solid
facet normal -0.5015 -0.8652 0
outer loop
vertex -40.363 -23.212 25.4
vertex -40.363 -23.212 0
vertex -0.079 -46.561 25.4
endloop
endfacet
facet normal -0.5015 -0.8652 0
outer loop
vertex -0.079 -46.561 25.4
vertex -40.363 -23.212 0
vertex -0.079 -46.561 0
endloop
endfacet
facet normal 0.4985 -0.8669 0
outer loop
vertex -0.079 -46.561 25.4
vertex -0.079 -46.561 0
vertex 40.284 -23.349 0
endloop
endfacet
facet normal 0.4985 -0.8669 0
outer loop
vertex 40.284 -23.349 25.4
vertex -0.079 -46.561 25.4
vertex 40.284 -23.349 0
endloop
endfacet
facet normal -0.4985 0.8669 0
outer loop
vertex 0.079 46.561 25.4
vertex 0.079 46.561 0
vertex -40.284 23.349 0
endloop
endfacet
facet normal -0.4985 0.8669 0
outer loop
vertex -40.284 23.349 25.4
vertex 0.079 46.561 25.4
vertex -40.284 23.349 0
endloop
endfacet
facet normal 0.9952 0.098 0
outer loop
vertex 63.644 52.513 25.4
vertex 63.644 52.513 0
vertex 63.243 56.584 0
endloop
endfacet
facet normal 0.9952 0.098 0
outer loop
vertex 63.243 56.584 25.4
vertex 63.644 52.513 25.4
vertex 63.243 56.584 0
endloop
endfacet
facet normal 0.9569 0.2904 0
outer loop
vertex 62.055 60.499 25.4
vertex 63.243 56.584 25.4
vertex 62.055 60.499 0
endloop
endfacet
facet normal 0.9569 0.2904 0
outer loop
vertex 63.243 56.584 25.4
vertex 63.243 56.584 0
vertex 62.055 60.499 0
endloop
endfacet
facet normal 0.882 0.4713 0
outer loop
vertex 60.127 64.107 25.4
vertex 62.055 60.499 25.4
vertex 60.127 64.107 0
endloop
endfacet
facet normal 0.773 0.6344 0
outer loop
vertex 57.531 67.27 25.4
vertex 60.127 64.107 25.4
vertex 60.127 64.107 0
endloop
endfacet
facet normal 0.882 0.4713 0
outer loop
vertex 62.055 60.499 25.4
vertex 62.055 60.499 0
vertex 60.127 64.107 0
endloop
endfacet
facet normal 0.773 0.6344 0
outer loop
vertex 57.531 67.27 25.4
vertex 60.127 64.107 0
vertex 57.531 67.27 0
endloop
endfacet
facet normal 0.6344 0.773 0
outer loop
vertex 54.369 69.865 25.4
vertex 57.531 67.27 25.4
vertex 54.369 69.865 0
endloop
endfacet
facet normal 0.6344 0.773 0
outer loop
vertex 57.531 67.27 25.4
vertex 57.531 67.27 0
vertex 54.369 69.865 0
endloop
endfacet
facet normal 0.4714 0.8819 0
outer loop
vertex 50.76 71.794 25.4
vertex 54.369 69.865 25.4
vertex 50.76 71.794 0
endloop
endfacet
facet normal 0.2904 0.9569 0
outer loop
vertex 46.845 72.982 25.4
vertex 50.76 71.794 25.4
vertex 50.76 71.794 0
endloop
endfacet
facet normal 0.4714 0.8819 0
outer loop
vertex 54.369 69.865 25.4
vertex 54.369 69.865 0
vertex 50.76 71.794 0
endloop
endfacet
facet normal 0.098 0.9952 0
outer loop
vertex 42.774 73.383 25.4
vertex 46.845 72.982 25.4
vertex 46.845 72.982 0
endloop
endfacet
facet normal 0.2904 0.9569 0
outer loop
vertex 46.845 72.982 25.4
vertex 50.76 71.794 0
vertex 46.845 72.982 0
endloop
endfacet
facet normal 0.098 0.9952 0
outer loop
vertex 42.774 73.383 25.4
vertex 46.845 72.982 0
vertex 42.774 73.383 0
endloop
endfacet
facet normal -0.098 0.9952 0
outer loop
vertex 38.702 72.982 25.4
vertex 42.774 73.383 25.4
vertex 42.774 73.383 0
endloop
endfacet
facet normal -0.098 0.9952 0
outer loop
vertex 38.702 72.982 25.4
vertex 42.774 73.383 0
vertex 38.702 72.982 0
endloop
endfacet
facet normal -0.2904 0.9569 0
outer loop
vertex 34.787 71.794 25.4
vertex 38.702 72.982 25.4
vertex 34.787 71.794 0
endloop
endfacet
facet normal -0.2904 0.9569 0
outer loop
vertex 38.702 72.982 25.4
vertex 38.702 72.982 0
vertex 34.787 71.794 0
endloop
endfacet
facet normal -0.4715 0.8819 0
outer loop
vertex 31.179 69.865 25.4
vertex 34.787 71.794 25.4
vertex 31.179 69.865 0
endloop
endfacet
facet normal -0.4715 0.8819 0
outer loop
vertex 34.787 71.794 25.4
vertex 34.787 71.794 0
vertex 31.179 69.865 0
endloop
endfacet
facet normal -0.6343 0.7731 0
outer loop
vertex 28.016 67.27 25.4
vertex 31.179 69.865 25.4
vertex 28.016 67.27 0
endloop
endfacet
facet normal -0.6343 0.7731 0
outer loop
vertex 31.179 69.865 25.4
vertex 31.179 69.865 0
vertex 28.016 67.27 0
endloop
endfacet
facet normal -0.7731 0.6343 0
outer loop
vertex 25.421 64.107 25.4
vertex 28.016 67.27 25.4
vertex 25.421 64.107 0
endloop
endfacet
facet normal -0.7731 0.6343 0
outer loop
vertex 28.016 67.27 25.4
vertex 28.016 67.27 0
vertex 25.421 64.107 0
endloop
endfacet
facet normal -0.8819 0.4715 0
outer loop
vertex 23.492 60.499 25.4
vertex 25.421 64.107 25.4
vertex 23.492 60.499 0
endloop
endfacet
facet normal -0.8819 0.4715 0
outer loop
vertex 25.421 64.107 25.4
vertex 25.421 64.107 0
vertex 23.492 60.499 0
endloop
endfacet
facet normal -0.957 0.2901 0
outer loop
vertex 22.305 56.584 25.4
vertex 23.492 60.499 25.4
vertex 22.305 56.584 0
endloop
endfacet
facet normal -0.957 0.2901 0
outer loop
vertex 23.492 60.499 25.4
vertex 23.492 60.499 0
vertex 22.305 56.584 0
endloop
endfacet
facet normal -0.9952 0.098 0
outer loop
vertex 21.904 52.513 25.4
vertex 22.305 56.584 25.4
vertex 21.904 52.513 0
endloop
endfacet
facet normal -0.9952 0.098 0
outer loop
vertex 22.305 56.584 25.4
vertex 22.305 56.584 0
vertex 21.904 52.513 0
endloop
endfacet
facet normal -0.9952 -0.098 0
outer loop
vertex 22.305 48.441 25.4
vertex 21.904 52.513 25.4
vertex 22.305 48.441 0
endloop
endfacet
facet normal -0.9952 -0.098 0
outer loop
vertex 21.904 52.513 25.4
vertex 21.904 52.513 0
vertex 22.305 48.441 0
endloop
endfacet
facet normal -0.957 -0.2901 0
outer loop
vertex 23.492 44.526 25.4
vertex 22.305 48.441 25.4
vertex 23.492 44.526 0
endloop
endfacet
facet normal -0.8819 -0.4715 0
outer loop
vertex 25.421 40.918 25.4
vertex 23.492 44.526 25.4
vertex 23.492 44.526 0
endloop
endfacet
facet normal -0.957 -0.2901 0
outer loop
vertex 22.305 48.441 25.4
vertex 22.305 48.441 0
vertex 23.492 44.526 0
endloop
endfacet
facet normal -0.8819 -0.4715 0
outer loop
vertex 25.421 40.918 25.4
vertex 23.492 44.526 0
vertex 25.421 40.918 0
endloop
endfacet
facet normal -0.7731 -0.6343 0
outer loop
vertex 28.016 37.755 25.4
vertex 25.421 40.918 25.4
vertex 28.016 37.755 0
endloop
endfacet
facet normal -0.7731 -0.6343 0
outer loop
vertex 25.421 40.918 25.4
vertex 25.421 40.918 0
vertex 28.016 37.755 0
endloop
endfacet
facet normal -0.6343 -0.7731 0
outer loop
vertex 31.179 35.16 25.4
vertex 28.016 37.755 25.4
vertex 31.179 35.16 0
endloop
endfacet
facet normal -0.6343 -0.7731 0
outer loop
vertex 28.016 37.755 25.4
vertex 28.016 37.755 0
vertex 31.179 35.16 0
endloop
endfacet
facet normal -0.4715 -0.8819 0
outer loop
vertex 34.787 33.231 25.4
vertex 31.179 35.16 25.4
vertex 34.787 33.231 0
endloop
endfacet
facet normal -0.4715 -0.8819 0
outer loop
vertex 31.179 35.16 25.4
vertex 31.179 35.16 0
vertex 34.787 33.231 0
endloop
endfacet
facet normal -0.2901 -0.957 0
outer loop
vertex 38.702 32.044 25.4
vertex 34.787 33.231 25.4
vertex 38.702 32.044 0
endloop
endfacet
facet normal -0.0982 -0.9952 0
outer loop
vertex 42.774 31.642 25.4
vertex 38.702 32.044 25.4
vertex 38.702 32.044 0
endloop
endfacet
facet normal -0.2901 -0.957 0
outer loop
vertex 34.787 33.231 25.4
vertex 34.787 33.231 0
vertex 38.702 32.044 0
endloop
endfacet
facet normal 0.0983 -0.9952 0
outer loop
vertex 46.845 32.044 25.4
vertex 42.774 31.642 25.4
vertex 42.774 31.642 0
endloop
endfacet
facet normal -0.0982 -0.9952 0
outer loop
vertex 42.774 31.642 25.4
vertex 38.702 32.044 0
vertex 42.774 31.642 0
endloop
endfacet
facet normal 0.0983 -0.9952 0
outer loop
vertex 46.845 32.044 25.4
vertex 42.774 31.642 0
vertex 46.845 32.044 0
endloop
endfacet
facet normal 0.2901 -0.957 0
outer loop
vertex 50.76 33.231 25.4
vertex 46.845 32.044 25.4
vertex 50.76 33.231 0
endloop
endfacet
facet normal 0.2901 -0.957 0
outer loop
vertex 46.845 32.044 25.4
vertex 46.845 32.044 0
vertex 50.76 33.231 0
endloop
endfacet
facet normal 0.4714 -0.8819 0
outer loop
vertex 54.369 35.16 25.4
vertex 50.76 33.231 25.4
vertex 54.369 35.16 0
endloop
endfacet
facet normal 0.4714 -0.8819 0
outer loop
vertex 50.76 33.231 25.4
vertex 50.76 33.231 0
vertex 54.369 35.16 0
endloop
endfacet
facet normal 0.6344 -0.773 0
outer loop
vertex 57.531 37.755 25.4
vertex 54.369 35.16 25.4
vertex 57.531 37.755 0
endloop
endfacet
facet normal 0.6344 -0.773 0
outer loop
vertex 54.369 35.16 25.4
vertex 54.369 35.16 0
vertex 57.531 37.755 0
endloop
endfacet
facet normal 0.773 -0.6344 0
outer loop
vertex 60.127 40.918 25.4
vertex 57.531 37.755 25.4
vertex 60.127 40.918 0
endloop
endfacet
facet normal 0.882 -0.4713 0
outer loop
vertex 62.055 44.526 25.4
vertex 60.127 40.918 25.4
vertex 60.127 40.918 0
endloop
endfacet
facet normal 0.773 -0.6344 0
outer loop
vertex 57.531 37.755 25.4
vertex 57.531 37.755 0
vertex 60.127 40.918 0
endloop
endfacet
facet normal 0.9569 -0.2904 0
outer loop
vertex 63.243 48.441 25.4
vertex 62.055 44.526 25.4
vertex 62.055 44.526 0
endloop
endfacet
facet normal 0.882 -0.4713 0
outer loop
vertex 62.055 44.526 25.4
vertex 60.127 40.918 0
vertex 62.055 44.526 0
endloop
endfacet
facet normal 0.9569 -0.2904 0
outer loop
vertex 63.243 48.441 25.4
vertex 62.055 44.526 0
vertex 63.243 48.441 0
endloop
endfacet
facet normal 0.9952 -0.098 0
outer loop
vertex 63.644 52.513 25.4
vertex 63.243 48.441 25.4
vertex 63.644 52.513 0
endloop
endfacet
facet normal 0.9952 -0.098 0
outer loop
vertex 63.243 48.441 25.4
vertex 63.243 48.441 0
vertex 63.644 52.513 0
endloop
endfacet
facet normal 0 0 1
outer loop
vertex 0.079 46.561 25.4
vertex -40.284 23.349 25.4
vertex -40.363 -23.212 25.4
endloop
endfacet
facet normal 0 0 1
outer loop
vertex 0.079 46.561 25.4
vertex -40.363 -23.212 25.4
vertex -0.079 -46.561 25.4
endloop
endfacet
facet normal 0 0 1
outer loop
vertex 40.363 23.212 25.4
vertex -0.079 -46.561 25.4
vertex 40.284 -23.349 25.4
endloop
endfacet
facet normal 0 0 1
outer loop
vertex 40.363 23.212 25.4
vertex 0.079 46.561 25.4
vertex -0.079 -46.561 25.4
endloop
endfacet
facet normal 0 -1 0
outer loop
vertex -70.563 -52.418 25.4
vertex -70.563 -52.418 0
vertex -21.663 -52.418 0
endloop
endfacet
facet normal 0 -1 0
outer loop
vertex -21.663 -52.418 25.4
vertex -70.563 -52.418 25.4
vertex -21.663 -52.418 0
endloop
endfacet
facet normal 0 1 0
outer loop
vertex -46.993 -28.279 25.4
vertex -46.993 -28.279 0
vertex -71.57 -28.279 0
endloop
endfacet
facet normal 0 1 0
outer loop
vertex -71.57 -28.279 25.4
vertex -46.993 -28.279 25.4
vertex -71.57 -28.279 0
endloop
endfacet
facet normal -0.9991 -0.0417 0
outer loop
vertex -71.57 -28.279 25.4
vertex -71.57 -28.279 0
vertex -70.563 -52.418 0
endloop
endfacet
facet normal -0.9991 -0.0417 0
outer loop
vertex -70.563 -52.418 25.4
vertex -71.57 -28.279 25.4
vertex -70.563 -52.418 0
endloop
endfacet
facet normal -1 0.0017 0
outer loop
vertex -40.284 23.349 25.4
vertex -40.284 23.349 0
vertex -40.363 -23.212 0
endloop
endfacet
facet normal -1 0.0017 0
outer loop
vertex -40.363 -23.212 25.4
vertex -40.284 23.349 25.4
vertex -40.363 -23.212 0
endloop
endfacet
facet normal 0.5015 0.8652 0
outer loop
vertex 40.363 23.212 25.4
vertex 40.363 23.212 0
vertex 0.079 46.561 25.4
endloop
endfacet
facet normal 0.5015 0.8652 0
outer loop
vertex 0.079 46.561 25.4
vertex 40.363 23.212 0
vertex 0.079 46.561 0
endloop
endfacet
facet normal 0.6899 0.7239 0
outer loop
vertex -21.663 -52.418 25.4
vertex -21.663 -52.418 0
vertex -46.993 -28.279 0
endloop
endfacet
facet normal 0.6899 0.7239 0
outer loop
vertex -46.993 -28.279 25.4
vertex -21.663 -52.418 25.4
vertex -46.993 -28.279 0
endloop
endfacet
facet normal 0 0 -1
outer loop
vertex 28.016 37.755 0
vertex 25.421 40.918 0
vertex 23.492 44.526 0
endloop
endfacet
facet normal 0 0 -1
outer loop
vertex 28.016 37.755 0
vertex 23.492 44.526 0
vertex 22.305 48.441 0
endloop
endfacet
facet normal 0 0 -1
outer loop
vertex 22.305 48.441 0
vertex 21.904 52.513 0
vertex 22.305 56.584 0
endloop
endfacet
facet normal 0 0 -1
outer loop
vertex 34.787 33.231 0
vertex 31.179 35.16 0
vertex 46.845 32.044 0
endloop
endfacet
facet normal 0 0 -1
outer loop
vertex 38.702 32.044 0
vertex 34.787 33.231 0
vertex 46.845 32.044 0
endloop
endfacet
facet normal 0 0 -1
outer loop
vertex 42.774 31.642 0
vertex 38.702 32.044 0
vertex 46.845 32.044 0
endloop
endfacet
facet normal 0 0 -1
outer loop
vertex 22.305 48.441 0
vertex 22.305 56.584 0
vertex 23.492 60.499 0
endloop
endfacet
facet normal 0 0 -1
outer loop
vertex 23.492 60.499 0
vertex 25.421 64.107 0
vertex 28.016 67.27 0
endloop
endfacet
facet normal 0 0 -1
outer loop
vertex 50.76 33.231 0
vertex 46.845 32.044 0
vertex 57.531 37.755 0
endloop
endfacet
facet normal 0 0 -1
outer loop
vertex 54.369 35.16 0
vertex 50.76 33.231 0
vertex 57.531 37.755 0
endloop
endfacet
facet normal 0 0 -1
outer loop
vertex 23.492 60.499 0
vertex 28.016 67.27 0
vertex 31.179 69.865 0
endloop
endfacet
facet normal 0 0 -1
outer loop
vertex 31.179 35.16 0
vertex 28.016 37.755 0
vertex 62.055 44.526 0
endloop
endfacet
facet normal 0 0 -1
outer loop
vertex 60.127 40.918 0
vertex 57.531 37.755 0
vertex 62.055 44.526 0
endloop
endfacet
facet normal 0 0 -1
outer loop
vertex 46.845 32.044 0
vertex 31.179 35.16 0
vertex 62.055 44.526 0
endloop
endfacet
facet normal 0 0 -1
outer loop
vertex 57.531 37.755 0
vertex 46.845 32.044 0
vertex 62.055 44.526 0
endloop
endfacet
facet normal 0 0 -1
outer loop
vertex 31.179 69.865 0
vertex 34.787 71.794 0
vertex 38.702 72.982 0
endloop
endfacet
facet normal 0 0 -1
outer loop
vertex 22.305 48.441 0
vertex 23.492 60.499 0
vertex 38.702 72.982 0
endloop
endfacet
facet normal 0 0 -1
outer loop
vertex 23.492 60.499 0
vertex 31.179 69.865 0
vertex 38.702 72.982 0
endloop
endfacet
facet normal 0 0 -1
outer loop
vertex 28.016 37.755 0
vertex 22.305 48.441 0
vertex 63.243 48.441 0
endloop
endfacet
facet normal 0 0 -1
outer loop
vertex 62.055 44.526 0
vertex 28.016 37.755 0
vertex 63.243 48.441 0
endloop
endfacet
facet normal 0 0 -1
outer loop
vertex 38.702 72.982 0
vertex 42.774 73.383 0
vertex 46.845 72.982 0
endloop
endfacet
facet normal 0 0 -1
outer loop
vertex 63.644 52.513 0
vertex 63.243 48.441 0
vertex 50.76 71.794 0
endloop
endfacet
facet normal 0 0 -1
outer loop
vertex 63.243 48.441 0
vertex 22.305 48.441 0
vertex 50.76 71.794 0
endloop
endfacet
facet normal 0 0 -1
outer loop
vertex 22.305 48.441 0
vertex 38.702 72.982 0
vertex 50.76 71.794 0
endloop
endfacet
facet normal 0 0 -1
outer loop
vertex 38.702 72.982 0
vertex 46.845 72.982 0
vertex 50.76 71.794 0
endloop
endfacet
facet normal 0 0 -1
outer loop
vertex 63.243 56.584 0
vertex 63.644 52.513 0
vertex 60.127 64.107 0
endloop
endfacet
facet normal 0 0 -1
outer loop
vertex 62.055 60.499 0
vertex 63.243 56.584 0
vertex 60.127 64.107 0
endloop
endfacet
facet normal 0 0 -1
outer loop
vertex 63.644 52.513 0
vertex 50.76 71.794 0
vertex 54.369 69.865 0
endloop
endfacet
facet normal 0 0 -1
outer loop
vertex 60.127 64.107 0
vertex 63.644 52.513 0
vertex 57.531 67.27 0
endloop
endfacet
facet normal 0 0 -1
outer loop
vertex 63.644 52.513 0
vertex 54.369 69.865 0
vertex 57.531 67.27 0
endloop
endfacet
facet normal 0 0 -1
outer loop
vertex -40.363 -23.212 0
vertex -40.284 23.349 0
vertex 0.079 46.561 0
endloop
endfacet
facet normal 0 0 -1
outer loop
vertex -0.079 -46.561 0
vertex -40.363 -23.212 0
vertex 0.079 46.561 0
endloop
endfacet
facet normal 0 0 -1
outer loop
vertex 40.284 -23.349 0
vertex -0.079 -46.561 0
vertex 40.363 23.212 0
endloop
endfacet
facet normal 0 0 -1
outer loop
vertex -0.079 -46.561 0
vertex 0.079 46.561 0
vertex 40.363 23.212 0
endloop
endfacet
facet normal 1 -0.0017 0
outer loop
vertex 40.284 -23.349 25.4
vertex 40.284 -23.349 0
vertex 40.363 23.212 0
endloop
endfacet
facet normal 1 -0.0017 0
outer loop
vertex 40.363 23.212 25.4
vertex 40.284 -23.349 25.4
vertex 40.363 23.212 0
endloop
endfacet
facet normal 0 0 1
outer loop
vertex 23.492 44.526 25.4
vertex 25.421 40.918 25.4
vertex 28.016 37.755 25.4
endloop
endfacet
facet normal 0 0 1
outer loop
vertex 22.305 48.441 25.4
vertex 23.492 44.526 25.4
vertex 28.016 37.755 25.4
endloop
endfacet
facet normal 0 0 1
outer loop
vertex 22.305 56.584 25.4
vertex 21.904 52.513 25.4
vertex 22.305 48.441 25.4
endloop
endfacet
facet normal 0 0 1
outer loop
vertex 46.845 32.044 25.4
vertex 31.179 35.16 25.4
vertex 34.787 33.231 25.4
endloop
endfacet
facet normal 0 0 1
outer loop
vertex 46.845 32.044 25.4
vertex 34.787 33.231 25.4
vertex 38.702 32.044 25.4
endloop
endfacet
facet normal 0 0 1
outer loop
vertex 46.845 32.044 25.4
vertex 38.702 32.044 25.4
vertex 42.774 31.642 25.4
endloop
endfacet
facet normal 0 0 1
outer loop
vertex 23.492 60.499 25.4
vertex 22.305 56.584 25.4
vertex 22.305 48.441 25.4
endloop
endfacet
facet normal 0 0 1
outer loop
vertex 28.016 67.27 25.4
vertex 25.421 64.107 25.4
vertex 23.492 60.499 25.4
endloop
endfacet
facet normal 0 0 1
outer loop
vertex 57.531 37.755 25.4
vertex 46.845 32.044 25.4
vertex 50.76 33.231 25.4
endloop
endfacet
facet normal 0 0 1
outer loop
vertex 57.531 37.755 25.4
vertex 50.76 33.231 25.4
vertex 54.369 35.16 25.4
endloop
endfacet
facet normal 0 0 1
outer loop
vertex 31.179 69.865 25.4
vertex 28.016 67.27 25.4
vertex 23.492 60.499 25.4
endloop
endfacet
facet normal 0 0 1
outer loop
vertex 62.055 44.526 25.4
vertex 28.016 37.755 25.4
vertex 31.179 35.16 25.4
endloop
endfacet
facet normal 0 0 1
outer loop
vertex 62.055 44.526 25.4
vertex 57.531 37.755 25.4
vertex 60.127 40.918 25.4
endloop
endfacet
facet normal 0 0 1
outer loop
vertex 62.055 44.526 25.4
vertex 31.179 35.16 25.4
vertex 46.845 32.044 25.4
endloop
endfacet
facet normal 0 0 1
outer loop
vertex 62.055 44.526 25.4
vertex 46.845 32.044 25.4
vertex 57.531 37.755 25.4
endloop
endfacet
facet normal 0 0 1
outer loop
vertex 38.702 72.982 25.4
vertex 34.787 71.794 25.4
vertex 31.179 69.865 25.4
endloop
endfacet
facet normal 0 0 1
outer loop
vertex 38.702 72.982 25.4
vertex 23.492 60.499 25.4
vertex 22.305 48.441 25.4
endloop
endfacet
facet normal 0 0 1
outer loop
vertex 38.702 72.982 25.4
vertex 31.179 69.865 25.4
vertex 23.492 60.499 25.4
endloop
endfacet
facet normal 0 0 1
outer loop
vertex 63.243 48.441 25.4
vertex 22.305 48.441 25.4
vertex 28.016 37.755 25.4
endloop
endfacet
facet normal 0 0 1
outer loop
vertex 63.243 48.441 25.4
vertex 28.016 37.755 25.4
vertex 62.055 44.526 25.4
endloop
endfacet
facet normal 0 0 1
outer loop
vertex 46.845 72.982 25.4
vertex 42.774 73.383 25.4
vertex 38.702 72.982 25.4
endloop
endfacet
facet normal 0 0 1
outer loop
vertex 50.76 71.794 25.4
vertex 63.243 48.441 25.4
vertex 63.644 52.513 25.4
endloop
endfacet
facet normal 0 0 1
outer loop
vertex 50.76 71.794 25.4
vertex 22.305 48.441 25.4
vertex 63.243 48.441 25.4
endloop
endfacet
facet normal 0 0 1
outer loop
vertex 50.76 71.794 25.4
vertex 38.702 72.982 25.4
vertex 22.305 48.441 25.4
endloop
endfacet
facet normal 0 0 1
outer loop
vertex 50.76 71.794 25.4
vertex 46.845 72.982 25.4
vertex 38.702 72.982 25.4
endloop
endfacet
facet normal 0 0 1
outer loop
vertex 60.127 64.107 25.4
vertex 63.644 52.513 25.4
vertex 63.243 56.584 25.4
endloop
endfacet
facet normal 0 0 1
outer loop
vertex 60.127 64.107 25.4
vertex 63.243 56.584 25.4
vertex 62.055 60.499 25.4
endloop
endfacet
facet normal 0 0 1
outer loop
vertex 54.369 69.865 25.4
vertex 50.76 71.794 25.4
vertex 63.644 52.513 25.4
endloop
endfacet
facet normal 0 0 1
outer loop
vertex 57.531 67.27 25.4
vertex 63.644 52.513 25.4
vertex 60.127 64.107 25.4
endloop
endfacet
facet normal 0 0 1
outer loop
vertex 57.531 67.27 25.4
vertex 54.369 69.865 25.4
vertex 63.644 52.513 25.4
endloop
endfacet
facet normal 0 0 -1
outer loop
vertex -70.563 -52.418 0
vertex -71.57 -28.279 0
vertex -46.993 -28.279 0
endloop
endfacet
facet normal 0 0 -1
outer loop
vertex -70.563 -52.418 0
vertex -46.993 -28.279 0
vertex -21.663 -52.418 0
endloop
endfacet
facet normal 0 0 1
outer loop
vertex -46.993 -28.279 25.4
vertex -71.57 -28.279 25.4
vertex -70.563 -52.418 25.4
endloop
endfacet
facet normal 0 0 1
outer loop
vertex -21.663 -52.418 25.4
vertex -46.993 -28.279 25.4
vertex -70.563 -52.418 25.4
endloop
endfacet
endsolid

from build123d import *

# Parameters (mm, degrees)
F1_DEPTH = 25.4
F2_R     = 20.870042
F3_DEPTH = 25.4
F5_DEPTH = 25.4


with BuildPart() as f1:
    # F0 (on Top) → F1 (new body)
    with BuildSketch(Plane.XY):
        Polygon((0.079192, 46.56136), (-40.283725, 23.349263), (-40.362917, -23.212098), (-0.079192, -46.56136), (40.283725, -23.349263), (40.362917, 23.212098), align=None)
    extrude(amount=F1_DEPTH)


with BuildPart() as f3:
    # F2 (on Top) → F3 (new body)
    with BuildSketch(Plane.XY):
        with Locations((42.773843, 52.51253)):
            Circle(F2_R)
    extrude(amount=F3_DEPTH)


with BuildPart() as f5:
    # F4 (on Top) → F5 (new body)
    with BuildSketch(Plane.XY):
        Polygon((-46.992816, -28.279468), (-71.570434, -28.279468), (-70.563495, -52.417614), (-21.662729, -52.417614), align=None)
    extrude(amount=F5_DEPTH)


solid = Compound([f1.part, f3.part, f5.part])
